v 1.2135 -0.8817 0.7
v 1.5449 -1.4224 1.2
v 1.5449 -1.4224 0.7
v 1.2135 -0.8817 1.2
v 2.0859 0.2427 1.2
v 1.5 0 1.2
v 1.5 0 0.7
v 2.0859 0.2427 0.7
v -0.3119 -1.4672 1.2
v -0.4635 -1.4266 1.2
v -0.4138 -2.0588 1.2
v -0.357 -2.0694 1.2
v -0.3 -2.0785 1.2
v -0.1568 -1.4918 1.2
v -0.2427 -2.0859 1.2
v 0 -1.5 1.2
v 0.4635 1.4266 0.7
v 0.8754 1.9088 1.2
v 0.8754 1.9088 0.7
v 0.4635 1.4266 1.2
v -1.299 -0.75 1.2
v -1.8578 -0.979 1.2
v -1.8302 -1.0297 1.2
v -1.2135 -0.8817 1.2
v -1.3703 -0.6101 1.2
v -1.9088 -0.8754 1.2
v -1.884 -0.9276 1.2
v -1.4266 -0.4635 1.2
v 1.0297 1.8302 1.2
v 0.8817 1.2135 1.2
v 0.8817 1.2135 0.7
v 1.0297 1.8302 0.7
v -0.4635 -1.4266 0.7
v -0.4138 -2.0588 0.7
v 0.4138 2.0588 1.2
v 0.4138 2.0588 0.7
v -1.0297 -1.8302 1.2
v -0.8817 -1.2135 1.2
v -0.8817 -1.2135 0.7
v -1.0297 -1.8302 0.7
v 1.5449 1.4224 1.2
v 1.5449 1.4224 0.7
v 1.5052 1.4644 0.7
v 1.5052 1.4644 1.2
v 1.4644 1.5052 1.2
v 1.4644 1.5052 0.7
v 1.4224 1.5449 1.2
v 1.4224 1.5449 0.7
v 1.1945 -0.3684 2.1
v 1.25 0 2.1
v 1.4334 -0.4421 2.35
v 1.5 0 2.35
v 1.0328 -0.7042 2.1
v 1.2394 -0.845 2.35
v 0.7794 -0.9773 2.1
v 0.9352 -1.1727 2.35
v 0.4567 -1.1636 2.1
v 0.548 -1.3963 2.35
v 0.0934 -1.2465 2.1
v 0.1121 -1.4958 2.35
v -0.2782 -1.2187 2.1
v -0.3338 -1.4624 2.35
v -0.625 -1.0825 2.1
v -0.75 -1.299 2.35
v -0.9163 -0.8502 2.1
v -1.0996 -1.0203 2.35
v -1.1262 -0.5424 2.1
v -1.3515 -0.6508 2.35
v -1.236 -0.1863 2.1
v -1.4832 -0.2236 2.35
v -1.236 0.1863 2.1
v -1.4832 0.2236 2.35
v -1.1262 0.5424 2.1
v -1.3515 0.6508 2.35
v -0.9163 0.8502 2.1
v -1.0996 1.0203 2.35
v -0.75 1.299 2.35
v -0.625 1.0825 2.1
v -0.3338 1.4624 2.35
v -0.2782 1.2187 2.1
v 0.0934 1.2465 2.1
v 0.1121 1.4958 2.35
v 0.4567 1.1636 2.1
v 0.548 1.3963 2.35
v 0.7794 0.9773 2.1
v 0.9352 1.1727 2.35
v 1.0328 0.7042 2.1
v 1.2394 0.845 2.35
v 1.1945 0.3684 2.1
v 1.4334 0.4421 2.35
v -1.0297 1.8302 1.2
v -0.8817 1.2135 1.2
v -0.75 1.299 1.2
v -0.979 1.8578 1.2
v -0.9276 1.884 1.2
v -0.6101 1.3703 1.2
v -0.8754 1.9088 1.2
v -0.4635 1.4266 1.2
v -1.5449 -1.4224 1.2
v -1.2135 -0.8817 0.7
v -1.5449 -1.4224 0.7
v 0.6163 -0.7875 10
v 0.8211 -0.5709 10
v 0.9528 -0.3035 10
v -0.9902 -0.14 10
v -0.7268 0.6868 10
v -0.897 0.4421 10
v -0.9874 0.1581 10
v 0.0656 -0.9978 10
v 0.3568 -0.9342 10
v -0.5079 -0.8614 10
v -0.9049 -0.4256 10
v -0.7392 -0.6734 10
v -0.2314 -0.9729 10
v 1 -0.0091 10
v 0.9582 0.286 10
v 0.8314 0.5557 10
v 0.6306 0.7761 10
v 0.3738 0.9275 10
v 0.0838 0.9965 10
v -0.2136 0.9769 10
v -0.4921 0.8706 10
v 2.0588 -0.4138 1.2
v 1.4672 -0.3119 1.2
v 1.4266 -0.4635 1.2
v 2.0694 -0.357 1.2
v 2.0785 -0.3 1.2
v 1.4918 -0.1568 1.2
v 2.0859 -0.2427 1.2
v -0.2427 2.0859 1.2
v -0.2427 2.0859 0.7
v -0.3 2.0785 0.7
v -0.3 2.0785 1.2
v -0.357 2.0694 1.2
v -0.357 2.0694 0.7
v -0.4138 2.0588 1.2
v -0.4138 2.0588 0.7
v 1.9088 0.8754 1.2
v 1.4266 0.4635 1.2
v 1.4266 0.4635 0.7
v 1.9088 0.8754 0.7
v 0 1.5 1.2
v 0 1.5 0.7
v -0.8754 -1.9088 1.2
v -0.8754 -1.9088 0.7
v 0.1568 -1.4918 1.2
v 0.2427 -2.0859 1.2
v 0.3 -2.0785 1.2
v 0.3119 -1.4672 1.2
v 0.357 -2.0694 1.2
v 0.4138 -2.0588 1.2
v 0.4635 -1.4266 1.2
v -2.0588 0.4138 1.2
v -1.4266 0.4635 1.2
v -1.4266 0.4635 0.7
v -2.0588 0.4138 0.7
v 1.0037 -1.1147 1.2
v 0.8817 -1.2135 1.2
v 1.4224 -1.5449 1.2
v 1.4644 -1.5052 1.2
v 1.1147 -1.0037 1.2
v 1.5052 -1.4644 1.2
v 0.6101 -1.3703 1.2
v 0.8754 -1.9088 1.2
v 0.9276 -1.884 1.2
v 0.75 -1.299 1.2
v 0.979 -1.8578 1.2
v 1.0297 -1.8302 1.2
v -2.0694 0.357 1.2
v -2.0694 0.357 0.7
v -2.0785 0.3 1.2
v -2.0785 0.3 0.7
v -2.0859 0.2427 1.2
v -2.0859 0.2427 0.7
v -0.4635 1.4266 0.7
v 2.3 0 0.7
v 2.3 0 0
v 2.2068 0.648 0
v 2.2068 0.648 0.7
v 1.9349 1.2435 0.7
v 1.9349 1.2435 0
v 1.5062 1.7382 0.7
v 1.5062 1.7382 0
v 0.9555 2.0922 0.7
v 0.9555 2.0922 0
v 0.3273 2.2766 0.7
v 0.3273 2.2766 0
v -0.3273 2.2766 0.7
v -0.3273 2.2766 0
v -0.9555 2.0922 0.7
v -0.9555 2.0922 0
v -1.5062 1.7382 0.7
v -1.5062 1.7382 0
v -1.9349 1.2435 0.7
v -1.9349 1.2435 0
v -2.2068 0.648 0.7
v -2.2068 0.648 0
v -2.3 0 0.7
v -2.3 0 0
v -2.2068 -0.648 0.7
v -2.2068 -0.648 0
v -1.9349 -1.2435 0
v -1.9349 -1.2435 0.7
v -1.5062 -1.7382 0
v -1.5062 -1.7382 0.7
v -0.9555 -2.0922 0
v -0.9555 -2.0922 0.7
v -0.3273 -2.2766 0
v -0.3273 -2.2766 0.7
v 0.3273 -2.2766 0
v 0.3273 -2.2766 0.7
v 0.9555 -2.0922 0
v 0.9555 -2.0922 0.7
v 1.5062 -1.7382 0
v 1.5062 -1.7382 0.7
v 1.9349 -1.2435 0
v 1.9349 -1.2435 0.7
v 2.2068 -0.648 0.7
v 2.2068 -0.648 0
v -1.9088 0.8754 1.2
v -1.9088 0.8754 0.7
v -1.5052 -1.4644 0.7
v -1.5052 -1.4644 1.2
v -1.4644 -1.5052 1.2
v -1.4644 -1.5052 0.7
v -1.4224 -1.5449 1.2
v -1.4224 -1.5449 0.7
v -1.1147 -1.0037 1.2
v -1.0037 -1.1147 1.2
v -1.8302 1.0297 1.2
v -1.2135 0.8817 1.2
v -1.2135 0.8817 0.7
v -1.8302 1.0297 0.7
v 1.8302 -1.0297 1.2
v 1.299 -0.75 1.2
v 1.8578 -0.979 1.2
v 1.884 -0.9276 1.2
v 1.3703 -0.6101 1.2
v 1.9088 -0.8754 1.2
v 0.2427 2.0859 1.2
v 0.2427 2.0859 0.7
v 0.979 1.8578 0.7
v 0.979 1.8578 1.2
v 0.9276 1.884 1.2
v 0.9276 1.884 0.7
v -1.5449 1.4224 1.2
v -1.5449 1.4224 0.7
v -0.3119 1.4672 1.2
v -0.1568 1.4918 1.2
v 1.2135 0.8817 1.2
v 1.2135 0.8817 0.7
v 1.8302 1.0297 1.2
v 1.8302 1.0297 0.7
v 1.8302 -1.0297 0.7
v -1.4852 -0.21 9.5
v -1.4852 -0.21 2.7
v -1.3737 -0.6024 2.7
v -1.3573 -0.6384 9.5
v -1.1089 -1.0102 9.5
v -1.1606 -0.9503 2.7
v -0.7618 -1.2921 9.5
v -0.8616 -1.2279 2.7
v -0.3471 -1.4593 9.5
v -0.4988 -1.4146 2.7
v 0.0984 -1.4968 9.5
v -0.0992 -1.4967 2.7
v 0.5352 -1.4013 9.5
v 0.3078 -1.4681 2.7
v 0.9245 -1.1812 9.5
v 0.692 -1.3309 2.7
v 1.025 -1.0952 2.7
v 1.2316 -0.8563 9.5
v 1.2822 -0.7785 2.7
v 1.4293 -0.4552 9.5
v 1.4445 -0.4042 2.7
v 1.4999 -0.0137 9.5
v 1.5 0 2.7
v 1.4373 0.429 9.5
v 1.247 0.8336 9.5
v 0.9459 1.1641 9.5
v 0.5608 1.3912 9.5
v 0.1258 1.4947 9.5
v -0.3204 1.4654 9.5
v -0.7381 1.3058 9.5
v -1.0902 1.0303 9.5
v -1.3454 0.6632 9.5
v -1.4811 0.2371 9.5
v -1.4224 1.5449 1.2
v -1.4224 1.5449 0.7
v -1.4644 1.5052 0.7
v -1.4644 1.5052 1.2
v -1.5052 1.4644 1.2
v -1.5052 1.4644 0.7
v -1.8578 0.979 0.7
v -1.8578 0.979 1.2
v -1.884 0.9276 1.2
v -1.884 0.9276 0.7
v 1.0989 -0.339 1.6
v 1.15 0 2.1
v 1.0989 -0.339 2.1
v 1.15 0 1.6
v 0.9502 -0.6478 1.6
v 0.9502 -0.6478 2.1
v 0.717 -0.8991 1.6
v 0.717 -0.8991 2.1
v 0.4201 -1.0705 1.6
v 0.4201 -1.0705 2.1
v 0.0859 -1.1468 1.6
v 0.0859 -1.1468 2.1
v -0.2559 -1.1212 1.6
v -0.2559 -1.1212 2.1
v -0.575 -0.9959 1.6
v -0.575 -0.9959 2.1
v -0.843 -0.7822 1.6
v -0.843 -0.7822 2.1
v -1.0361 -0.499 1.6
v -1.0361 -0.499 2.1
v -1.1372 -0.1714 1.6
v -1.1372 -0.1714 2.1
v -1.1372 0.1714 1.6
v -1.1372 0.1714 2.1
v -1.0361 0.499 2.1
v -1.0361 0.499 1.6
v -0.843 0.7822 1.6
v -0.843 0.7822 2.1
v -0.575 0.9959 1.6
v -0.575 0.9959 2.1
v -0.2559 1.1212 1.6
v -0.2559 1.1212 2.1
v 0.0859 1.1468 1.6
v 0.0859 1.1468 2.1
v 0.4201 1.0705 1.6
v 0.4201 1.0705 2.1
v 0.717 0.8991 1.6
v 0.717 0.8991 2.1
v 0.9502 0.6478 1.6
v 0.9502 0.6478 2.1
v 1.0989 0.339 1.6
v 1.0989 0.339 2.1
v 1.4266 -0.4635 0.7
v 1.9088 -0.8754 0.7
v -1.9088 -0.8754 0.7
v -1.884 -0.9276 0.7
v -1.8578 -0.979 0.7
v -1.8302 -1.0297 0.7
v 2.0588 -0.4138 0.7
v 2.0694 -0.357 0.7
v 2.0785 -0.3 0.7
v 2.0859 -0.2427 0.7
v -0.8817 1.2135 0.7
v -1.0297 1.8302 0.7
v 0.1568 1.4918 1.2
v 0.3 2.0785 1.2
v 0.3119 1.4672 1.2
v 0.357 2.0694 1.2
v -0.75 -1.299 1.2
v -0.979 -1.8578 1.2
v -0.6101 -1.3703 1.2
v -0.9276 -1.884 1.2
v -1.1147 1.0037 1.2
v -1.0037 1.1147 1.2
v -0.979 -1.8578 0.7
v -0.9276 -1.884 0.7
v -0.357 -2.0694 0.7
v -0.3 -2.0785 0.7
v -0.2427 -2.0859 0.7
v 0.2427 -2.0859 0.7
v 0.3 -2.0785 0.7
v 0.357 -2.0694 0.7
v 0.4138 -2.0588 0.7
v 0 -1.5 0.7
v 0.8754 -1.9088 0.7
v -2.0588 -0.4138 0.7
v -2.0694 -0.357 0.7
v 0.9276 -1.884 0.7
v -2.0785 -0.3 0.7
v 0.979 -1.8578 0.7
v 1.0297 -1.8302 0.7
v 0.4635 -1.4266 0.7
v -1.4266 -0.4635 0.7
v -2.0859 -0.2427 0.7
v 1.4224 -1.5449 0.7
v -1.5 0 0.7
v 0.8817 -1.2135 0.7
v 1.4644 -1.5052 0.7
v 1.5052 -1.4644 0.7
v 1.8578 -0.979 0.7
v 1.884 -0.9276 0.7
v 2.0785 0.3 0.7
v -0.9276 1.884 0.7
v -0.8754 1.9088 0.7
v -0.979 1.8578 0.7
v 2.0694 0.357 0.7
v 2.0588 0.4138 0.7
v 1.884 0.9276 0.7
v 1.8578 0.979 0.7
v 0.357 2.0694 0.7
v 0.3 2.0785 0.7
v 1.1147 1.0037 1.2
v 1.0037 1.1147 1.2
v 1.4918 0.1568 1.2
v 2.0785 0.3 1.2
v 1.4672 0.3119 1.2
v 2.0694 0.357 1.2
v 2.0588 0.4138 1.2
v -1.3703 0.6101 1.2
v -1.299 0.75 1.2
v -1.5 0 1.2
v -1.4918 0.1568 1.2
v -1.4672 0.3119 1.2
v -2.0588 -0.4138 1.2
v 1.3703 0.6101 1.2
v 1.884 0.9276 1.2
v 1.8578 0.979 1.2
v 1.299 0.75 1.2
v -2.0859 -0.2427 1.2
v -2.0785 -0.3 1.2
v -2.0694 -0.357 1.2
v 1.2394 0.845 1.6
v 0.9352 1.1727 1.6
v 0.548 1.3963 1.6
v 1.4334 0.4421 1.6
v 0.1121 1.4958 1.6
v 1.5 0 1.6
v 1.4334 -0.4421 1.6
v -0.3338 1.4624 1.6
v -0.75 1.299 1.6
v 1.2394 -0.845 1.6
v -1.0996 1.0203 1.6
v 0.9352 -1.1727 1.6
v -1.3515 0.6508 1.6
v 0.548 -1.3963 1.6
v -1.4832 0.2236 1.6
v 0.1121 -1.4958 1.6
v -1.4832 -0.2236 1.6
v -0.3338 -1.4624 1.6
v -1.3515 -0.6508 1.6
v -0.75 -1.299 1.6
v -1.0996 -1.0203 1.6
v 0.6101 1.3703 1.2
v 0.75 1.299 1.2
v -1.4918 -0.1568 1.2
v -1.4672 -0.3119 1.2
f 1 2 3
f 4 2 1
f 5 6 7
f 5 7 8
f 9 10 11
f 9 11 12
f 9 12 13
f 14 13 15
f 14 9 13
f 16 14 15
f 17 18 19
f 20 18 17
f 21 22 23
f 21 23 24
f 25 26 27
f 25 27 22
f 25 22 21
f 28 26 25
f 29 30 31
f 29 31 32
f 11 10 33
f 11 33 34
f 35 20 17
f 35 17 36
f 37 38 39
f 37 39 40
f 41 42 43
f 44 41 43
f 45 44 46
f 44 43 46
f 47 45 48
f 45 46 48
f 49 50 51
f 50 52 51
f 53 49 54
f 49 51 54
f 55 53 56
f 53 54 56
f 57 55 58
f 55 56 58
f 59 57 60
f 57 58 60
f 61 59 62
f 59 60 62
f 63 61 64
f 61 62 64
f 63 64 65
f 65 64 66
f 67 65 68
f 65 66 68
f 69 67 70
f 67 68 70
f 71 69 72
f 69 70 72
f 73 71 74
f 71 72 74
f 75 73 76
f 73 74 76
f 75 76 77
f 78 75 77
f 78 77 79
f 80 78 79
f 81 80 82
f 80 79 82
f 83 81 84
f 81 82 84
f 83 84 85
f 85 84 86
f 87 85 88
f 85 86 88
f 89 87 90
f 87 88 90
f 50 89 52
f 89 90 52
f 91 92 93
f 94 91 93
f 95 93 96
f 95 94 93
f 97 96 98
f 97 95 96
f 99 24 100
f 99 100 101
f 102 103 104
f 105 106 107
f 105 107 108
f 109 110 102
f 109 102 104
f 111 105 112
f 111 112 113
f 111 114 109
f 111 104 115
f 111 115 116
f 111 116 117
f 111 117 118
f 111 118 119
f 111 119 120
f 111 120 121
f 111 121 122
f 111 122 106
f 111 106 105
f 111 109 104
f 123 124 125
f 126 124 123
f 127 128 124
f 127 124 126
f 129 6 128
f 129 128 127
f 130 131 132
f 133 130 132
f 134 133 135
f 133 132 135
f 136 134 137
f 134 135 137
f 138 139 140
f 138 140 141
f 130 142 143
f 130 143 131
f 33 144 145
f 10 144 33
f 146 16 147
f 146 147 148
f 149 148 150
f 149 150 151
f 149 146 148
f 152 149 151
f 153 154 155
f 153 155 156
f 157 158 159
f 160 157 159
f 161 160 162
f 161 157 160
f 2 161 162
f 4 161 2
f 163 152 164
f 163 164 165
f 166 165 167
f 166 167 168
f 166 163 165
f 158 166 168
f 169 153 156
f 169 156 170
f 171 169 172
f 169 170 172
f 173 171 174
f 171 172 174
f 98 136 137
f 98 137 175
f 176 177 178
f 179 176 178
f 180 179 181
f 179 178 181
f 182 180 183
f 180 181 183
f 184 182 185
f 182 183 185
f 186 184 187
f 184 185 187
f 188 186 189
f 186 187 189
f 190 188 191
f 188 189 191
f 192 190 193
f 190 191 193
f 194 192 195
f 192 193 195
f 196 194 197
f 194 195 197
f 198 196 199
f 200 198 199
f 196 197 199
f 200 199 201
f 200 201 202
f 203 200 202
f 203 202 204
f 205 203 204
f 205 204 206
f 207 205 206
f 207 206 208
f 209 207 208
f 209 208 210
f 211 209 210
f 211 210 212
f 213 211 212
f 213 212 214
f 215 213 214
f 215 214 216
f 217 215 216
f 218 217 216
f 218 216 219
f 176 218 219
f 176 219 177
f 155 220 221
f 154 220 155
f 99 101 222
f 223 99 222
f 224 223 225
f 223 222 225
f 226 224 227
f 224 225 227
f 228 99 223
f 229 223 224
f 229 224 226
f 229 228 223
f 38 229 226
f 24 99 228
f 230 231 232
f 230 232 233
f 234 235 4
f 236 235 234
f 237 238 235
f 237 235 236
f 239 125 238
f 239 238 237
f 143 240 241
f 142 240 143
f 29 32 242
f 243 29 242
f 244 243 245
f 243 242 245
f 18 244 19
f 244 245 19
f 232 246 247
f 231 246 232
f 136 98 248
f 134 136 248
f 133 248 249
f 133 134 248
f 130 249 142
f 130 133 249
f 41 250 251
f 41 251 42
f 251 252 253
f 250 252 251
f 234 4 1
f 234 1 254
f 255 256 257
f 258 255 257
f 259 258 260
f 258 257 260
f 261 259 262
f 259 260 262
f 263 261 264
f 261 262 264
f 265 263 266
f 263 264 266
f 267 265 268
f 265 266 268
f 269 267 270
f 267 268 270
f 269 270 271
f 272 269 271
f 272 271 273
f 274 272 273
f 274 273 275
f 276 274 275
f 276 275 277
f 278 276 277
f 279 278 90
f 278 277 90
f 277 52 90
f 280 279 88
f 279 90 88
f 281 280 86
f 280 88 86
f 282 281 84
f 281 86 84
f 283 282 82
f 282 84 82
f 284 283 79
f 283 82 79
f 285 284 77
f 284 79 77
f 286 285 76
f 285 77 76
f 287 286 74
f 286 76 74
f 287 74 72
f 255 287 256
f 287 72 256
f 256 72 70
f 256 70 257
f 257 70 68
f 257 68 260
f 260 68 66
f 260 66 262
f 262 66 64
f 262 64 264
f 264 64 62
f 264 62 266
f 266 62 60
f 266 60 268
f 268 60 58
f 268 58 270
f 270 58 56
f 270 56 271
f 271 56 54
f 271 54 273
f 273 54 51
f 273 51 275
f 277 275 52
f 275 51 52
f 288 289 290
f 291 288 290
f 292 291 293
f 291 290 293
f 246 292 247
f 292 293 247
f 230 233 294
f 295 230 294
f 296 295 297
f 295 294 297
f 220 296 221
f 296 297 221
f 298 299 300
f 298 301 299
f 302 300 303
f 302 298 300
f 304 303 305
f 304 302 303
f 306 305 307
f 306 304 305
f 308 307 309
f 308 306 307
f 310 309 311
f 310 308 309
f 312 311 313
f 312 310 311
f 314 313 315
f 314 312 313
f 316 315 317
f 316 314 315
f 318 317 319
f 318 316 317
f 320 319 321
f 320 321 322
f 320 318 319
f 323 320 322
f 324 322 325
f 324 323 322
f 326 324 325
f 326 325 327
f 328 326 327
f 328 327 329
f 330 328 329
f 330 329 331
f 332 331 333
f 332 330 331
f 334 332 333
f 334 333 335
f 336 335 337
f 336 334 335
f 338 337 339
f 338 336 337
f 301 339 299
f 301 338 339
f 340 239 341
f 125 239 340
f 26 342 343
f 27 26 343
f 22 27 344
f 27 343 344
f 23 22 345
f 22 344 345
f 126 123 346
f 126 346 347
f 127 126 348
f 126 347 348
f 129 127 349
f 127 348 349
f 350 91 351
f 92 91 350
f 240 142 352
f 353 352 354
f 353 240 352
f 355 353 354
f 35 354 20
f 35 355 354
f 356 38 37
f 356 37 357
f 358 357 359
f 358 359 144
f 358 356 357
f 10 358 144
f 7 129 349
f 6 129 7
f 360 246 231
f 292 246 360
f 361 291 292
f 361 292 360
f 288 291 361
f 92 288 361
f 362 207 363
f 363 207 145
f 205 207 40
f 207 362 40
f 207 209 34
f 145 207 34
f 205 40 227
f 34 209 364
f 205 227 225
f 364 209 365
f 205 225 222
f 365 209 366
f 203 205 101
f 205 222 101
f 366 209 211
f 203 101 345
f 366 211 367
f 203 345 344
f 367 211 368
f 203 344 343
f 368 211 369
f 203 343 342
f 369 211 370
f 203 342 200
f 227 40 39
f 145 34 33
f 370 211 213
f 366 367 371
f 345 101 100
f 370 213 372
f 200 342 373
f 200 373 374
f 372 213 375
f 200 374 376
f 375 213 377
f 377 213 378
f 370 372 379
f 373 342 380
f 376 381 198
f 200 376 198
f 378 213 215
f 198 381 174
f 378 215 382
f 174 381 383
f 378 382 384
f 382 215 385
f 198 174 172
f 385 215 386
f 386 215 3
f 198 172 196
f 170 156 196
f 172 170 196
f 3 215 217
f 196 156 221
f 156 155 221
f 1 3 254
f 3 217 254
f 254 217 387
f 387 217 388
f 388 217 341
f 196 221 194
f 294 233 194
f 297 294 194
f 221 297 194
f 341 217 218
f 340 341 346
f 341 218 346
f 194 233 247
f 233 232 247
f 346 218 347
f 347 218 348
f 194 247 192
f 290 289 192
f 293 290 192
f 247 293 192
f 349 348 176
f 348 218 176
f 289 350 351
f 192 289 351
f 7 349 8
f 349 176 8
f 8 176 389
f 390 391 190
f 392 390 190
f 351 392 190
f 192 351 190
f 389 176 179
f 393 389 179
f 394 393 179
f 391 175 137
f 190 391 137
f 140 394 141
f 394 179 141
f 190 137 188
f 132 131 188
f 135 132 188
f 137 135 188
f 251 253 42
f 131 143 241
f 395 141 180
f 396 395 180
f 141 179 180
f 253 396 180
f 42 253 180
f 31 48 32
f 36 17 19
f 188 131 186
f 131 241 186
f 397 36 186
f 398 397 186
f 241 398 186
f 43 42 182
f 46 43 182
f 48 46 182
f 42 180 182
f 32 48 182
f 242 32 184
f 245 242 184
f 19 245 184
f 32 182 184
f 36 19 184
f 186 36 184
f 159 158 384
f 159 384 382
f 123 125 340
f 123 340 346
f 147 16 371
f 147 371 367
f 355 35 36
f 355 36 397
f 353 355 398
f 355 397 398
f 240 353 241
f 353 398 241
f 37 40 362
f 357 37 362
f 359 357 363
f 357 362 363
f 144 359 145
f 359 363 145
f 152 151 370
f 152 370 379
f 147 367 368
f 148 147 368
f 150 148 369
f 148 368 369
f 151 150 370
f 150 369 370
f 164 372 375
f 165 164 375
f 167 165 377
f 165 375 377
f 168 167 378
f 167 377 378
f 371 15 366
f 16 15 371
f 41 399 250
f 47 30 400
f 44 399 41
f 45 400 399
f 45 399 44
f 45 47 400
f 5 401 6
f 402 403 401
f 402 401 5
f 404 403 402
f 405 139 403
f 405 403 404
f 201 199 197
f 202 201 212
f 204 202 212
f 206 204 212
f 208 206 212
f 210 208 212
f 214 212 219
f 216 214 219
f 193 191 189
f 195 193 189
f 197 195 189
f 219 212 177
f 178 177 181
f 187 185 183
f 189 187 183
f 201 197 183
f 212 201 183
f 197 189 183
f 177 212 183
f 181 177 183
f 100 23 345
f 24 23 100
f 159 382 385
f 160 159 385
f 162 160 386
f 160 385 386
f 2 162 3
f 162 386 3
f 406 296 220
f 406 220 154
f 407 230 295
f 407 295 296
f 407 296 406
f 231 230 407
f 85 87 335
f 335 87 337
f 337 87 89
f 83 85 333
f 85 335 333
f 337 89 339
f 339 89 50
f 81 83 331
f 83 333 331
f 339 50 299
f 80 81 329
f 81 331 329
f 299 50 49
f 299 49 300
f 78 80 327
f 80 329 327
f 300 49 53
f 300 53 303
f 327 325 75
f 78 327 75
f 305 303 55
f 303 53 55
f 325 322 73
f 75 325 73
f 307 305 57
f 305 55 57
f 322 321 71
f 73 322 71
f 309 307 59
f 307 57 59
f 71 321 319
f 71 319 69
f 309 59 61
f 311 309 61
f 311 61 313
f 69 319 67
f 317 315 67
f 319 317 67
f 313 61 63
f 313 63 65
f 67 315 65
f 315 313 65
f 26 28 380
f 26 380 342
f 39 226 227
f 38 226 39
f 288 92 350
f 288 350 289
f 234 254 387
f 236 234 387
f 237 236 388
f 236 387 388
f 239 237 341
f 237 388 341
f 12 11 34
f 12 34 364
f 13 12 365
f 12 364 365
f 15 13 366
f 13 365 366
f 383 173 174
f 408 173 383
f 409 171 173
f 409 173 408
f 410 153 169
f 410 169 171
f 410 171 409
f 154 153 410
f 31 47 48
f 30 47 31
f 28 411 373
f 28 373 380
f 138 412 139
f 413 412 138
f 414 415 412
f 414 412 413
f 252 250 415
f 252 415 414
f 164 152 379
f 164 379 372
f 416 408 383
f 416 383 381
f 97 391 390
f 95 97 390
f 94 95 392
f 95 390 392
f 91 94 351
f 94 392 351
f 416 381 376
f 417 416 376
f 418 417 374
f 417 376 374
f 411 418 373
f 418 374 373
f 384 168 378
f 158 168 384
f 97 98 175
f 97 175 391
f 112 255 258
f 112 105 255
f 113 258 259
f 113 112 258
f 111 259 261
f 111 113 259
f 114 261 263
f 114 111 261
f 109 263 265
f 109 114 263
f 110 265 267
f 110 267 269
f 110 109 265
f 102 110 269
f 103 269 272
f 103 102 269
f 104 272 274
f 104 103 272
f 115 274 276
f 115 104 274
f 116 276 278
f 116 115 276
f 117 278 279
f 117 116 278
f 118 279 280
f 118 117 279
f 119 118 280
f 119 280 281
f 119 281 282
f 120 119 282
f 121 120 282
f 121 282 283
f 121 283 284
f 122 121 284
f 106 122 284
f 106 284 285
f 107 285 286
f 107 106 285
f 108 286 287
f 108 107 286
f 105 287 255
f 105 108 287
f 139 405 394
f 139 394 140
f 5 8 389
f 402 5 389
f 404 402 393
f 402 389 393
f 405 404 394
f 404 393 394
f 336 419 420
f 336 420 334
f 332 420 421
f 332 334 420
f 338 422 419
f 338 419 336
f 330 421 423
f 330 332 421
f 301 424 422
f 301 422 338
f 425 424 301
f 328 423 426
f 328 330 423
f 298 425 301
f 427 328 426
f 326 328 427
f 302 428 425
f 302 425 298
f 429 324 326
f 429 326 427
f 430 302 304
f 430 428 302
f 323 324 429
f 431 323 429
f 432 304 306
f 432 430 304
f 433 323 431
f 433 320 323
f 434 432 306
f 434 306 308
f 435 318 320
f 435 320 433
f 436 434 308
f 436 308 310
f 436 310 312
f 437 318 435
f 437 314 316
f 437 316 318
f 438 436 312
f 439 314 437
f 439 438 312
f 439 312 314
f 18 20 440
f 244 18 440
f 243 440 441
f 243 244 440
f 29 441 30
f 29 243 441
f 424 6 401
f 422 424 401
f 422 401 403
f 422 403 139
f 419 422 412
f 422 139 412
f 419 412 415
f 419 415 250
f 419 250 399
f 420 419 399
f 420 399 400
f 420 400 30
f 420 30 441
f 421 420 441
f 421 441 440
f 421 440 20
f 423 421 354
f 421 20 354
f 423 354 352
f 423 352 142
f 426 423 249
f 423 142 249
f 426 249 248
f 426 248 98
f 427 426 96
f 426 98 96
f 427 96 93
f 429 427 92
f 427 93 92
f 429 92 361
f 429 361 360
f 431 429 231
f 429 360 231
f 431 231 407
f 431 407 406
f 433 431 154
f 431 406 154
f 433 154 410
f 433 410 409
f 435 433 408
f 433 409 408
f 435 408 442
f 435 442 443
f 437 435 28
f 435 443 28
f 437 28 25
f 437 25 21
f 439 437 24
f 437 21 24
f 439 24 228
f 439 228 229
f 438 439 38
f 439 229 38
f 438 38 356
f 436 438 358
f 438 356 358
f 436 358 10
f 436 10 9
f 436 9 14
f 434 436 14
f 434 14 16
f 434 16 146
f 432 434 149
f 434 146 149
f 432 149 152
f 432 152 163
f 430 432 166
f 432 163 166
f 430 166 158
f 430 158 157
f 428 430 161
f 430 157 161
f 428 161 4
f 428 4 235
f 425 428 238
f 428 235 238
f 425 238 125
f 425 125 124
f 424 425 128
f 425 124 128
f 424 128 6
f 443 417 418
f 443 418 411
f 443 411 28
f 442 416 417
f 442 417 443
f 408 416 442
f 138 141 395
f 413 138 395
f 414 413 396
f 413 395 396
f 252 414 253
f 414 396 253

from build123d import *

# Parameters (mm, degrees)
SKETCH_1_R               = 2.3
EXTRUDE_1_DEPTH          = 1.2
SKETCH_2_R               = 1.5
EXTRUDE_2_DEPTH          = 1.5
CUT_EXTRUDE_1_DEPTH      = 0.5
PATTERN_CIRCULAR_1_COUNT = 20
SKETCH_4_W               = 0.35
SKETCH_4_H               = 0.5
SKETCH_6_W               = 7.3
SKETCH_6_H               = 1.5
CHAMFER_2_SIZE           = 0.5
CUT_EXTRUDE_START        = -0.5
SKETCH_7_R               = 2.3
SKETCH_7_R_2             = 2.1
CUT_EXTRUDE_2_DEPTH      = 0.5


with BuildPart() as part:
    # Эскиз1 → Вытянуть1 (new body)
    with BuildSketch(Plane.XY):
        Circle(SKETCH_1_R)
    extrude(amount=EXTRUDE_1_DEPTH)

    # Эскиз2 → Вытянуть2 (add)
    with BuildSketch(Plane.XY.offset(1.2)):
        Circle(SKETCH_2_R)
    extrude(amount=EXTRUDE_2_DEPTH)

    # Эскиз3 → Вырез-Вытянуть1 (cut)
    with BuildSketch(Plane.XY.offset(1.2)):
        Polygon((-0.33137085, 2.3), (0.33137085, 2.3), (0, 1.5), align=None)
    cut_extrude_1 = extrude(amount=-CUT_EXTRUDE_1_DEPTH, mode=Mode.SUBTRACT)

    # Круговой массив1: Вырез-Вытянуть1 ×20 about axis
    pattern_circular_1_axis = Axis((0, 0, 0), (0, 0, 1))
    for i in range(1, PATTERN_CIRCULAR_1_COUNT):
        add(cut_extrude_1.rotate(pattern_circular_1_axis, i * 360 / PATTERN_CIRCULAR_1_COUNT), mode=Mode.SUBTRACT)

    # Эскиз4 → Вырез-Повернуть1 (revolve, cut)
    with BuildSketch(Plane(origin=(0, 0, 0), x_dir=(1, 0, 0), z_dir=(0, 1, 0))):
        with Locations((1.325, -1.85)):
            Rectangle(SKETCH_4_W, SKETCH_4_H)
    revolve(axis=Axis((0, 0, 10.642619983), (0, 0, -1)), mode=Mode.SUBTRACT)

    # Эскиз6 → Повернуть1 (revolve)
    with BuildSketch(Plane(origin=(0, 0, 0), x_dir=(0, 0, -1), z_dir=(1, 0, 0)), mode=Mode.PRIVATE) as revolve_1_sk:
        with Locations((-6.35, -0.75)):
            Rectangle(SKETCH_6_W, SKETCH_6_H)
    revolve(revolve_1_sk.sketch.rotate(Axis((0, 0, 2.7), (0, 0, 1)), 278.047567557), axis=Axis((0, 0, 2.7), (0, 0, 1)))

    # Фаска2
    # the kernel refuses this chamfer: 0.5 mm, written as the material it takes off along each edge
    with BuildSketch(Plane(origin=(0, 0, 10), x_dir=(-0.9901521845161062, -0.1399951838385265, 0), z_dir=(-0.1399951838385265, 0.9901521845161062, 0))) as chamfer_2_piece_1:
        Polygon((1.5, -CHAMFER_2_SIZE), (1.5 - CHAMFER_2_SIZE, 0), (1.5, 0), align=None)
    revolve(axis=Axis((0, 0, 10), (0, 0, 1)), mode=Mode.SUBTRACT)

    # Эскиз7 → Вырез-Вытянуть2 (cut)
    with BuildSketch(Plane.XY.offset(1.2).offset(CUT_EXTRUDE_START)):
        with Locations(Location((0, 0, 0), (0, 0, 180))):
            Circle(SKETCH_7_R)
        Circle(SKETCH_7_R_2, mode=Mode.SUBTRACT)
    extrude(amount=CUT_EXTRUDE_2_DEPTH, mode=Mode.SUBTRACT)

    # Фаска3
    # the kernel refuses this chamfer: 0.25 mm, written as the material it takes off along each edge
    with BuildSketch(Plane(origin=(0, 0, 2.1), x_dir=(1, 0, 0), z_dir=(0, 1, 0))) as chamfer_3_piece_1:
        with BuildLine():
            Line((1.242928932, 0.007071068), (1.507071068, -0.257071068))
            Line((1.507071068, -0.257071068), (1.512071068, -0.257071068))
            ThreePointArc((1.512071068, -0.257071068), (1.505, -0.128535534), (1.505, 0))
            Line((1.505, 0), (1.5, 0.005))
            ThreePointArc((1.5, 0.005), (1.371464466, 0.005), (1.242928932, 0.012071068))
            Line((1.242928932, 0.012071068), (1.242928932, 0.007071068))
        make_face()
    revolve(axis=Axis((0, 0, 2.1), (0, 0, -1)), mode=Mode.SUBTRACT)


solid = part.part
